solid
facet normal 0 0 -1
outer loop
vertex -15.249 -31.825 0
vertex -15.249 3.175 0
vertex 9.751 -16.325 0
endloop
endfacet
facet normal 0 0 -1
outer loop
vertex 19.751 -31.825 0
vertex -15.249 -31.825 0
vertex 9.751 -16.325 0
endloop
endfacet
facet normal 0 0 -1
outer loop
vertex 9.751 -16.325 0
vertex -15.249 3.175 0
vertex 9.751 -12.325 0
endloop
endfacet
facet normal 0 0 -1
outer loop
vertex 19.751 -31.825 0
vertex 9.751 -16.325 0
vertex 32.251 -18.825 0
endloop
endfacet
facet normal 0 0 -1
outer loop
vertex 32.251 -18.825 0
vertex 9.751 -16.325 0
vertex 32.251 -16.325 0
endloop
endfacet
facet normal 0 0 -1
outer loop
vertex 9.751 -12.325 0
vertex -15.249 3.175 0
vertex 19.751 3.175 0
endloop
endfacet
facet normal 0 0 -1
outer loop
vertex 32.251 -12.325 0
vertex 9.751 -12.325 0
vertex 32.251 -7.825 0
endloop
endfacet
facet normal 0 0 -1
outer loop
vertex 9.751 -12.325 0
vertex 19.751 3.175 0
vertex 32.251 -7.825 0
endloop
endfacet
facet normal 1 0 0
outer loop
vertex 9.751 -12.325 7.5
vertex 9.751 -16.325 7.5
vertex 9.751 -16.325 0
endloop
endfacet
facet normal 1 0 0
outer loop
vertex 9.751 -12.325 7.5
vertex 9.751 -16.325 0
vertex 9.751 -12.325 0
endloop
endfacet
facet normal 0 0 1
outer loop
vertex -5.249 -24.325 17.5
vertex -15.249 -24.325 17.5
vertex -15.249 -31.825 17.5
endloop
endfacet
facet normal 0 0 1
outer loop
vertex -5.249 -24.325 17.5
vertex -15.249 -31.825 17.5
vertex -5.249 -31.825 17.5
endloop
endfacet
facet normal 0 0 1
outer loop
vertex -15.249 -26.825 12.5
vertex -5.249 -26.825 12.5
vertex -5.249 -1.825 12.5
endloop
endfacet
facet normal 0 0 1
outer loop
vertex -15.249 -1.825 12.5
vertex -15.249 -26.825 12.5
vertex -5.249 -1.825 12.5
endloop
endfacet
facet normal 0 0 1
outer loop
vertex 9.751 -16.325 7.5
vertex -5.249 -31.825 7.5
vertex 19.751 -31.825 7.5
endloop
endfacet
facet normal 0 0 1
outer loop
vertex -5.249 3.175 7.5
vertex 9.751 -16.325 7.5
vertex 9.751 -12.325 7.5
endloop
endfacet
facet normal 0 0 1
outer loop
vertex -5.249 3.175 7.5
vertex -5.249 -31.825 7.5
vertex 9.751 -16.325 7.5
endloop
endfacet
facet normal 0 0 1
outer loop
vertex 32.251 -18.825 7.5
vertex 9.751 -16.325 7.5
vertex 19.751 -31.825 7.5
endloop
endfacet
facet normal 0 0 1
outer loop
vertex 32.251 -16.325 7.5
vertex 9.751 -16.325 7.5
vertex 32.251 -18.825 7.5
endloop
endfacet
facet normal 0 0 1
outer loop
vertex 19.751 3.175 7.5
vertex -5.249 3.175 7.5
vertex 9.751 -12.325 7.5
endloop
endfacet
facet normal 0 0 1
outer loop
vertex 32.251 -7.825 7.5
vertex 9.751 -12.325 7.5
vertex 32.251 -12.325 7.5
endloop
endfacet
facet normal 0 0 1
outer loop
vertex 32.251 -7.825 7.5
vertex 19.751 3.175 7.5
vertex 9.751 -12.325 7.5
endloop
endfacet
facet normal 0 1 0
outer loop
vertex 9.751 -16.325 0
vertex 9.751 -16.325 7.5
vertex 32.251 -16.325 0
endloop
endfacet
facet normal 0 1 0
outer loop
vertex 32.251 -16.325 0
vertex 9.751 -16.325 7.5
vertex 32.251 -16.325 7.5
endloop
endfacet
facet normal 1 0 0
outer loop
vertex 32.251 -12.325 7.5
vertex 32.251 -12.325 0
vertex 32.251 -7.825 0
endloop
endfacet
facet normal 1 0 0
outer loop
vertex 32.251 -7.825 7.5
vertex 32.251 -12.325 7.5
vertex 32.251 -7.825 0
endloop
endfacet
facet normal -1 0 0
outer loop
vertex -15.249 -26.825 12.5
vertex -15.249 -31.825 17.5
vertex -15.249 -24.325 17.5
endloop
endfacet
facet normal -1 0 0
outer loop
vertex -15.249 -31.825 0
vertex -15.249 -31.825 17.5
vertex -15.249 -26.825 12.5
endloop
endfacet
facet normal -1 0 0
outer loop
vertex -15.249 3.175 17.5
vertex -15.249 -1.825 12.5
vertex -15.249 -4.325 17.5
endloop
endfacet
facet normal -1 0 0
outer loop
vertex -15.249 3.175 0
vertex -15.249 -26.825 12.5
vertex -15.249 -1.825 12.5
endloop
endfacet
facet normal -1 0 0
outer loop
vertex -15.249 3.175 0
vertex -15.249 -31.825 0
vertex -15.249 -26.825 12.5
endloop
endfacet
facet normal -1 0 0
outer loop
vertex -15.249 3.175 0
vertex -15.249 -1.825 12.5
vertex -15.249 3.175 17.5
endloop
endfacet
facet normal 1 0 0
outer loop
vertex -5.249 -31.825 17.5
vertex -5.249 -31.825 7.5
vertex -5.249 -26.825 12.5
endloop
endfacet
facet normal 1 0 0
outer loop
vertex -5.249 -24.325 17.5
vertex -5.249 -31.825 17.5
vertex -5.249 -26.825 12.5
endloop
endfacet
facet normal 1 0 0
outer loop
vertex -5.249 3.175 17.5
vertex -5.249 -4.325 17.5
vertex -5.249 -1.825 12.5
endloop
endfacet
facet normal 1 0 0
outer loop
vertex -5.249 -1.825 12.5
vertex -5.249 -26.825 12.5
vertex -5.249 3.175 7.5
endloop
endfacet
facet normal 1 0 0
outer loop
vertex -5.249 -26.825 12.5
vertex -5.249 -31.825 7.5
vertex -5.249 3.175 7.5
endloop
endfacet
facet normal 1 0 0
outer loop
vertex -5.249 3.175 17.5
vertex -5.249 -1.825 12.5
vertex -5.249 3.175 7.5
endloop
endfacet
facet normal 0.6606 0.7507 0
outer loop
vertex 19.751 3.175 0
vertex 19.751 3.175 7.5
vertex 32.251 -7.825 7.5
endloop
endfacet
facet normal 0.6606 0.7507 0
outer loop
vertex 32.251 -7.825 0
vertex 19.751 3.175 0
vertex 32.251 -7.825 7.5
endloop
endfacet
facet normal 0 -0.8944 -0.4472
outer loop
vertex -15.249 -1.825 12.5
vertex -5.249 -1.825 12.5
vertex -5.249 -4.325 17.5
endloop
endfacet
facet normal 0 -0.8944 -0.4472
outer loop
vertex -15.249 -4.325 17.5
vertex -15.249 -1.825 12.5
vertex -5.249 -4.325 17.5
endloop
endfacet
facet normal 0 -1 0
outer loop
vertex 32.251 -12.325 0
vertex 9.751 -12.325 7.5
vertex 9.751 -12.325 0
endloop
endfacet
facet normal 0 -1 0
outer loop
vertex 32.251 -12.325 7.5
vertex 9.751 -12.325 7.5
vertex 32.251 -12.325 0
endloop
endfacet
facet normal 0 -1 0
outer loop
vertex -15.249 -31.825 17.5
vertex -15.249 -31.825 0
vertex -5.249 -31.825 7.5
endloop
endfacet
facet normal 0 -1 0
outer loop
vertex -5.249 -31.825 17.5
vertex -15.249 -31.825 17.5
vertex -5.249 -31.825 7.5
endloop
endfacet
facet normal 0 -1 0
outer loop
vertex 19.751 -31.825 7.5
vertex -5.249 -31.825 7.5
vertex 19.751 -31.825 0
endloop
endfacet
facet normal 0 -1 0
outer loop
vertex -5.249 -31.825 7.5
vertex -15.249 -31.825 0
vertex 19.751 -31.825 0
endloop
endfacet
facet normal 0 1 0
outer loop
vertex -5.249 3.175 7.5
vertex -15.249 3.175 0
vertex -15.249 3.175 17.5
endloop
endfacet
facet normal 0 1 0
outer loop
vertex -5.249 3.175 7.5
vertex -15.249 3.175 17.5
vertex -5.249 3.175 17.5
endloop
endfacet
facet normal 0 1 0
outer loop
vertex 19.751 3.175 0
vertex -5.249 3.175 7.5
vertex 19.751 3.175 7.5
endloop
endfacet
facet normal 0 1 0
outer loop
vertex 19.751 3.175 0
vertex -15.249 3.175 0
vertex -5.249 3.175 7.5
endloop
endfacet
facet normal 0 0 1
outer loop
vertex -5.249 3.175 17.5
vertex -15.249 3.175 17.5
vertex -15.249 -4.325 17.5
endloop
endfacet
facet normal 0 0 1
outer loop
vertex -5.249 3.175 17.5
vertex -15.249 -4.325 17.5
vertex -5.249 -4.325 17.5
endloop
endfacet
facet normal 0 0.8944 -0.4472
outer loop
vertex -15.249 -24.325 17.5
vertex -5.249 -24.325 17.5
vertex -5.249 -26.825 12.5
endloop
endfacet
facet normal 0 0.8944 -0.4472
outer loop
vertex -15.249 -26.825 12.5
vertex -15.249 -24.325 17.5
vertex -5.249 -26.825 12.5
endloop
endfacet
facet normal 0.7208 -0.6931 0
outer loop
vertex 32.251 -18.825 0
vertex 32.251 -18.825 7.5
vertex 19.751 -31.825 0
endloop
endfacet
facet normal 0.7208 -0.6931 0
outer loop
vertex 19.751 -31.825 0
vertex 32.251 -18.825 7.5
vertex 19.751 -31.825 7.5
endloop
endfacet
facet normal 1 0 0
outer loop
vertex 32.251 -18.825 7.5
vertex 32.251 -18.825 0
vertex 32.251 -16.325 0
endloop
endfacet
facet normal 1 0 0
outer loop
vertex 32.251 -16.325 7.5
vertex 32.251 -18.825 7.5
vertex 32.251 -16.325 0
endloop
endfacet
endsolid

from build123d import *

# Parameters (mm, degrees)
F0_W      = 47.5
F0_H      = 35
F1_DEPTH  = 7.5
F2_W      = 10
F2_H      = 35
F3_DEPTH  = 10
F5_DEPTH  = 10.001
F7_DEPTH  = 7.501
F9_DEPTH  = 7.501
F10_W     = 22.5
F10_H     = 4
F11_DEPTH = 7.501


with BuildPart() as f1:
    # F0 (on Top) → F1 (new body)
    with BuildSketch(Plane.XY):
        with Locations((8.500643, -14.324561)):
            Rectangle(F0_W, F0_H)
    extrude(amount=F1_DEPTH)

    # F2 (on face) → F3 (join)
    with BuildSketch(Plane.XY.offset(7.5)):
        with Locations((-10.249357, -14.324561)):
            Rectangle(F2_W, F2_H)
    extrude(amount=F3_DEPTH)

    # F4 (on face) → F5 (cut, through all)
    with BuildSketch(Plane.YZ.offset(-5.249357)):
        Polygon((-1.824561, 12.5), (-4.324561, 17.5), (-24.324561, 17.5), (-26.824561, 12.5), align=None)
    extrude(amount=-F5_DEPTH, mode=Mode.SUBTRACT)

    # F6 (on face) → F7 (cut, through all)
    with BuildSketch(Plane.XY.offset(7.5)):
        Polygon((19.750643, -31.824561), (32.250643, -31.824561), (32.250643, -18.824561), align=None)
    extrude(amount=-F7_DEPTH, mode=Mode.SUBTRACT)

    # F8 (on face) → F9 (cut, through all)
    with BuildSketch(Plane.XY.offset(7.5)):
        Polygon((19.750643, 3.175439), (32.250643, -7.824561), (32.250643, 3.175439), align=None)
    extrude(amount=-F9_DEPTH, mode=Mode.SUBTRACT)

    # F10 (on face) → F11 (cut, through all)
    with BuildSketch(Plane.XY.offset(7.5)):
        with Locations((21.000643, -14.324561)):
            Rectangle(F10_W, F10_H)
    extrude(amount=-F11_DEPTH, mode=Mode.SUBTRACT)


solid = f1.part
